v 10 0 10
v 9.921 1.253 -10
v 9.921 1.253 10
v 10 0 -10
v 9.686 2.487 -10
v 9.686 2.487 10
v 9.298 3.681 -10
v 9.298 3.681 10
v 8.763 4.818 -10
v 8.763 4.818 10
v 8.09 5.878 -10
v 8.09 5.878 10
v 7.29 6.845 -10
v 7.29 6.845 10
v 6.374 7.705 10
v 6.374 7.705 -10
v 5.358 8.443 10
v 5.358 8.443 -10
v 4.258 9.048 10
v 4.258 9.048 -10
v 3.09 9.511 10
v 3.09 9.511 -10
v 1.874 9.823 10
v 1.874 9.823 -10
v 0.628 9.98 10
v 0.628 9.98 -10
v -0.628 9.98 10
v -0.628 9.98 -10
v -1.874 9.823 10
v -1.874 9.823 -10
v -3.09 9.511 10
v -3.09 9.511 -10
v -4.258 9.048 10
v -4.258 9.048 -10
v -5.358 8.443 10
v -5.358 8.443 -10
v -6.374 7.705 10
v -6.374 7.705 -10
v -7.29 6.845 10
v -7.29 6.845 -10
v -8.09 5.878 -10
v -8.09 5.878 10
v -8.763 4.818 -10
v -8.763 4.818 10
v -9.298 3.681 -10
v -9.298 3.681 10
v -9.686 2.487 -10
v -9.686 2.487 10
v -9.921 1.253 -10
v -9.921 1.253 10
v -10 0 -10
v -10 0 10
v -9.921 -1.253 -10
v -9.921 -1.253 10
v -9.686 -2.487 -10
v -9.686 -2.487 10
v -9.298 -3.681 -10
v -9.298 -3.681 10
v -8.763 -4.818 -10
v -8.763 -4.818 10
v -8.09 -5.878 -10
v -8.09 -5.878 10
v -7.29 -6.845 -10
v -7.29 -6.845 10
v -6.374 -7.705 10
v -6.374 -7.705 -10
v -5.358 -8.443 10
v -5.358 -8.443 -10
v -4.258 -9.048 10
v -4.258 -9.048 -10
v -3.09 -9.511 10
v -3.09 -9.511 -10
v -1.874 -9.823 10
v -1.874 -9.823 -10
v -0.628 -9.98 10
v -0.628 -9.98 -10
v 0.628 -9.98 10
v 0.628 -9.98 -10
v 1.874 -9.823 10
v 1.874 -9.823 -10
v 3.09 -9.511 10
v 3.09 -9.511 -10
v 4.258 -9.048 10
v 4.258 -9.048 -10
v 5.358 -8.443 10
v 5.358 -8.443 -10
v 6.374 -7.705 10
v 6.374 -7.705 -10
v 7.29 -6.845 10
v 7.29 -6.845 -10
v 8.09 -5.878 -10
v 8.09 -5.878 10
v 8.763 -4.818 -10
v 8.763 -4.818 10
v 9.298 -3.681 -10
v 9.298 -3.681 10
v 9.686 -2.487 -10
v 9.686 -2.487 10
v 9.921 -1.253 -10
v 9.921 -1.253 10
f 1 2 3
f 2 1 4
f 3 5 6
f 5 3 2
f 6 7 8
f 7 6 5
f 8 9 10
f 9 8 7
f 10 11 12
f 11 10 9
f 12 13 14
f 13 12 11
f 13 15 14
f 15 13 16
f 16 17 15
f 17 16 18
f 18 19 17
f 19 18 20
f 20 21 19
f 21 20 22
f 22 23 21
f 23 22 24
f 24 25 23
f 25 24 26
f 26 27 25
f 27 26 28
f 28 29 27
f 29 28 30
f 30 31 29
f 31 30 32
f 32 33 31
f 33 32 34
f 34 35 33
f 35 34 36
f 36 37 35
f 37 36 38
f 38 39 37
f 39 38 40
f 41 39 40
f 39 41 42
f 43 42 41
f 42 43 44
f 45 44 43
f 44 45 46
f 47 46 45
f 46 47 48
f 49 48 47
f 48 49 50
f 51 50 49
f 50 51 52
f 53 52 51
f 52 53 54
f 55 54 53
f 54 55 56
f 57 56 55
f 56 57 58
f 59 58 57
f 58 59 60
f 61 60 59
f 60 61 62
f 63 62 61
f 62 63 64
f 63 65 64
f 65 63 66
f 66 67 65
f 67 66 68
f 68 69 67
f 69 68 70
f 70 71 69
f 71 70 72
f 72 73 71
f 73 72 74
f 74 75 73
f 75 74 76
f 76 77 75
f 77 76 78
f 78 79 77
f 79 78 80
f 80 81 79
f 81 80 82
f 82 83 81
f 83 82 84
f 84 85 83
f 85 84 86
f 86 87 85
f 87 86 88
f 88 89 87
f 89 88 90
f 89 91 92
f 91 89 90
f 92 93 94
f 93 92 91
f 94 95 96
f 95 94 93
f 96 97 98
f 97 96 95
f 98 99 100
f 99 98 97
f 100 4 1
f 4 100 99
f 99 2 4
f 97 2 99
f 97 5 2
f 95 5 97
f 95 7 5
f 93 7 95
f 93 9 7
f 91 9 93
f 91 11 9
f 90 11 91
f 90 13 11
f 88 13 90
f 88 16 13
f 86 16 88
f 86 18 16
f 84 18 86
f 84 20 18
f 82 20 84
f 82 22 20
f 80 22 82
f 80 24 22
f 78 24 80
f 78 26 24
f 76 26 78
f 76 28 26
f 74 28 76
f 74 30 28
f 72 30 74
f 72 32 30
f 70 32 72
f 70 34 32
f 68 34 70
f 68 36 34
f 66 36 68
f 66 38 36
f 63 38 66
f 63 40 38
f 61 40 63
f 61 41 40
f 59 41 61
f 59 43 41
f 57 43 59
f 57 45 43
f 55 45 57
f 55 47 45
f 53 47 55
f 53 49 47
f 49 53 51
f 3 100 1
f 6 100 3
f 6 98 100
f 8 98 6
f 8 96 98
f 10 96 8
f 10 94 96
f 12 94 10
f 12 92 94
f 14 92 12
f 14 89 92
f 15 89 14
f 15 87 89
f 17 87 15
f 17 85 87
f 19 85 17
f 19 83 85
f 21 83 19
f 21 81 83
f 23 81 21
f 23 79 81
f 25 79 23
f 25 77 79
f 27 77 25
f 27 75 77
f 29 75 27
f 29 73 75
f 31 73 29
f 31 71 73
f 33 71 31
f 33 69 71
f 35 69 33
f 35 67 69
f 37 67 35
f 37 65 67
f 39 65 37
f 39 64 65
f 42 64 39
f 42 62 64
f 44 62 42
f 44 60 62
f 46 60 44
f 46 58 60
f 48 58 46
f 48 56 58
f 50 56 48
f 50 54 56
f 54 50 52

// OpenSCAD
// Parameters
cylinder_radius = 10;
cylinder_height = 20;
$fn = 50;

// Model
color("green")
  cylinder(h=cylinder_height, r=cylinder_radius, center=true);
